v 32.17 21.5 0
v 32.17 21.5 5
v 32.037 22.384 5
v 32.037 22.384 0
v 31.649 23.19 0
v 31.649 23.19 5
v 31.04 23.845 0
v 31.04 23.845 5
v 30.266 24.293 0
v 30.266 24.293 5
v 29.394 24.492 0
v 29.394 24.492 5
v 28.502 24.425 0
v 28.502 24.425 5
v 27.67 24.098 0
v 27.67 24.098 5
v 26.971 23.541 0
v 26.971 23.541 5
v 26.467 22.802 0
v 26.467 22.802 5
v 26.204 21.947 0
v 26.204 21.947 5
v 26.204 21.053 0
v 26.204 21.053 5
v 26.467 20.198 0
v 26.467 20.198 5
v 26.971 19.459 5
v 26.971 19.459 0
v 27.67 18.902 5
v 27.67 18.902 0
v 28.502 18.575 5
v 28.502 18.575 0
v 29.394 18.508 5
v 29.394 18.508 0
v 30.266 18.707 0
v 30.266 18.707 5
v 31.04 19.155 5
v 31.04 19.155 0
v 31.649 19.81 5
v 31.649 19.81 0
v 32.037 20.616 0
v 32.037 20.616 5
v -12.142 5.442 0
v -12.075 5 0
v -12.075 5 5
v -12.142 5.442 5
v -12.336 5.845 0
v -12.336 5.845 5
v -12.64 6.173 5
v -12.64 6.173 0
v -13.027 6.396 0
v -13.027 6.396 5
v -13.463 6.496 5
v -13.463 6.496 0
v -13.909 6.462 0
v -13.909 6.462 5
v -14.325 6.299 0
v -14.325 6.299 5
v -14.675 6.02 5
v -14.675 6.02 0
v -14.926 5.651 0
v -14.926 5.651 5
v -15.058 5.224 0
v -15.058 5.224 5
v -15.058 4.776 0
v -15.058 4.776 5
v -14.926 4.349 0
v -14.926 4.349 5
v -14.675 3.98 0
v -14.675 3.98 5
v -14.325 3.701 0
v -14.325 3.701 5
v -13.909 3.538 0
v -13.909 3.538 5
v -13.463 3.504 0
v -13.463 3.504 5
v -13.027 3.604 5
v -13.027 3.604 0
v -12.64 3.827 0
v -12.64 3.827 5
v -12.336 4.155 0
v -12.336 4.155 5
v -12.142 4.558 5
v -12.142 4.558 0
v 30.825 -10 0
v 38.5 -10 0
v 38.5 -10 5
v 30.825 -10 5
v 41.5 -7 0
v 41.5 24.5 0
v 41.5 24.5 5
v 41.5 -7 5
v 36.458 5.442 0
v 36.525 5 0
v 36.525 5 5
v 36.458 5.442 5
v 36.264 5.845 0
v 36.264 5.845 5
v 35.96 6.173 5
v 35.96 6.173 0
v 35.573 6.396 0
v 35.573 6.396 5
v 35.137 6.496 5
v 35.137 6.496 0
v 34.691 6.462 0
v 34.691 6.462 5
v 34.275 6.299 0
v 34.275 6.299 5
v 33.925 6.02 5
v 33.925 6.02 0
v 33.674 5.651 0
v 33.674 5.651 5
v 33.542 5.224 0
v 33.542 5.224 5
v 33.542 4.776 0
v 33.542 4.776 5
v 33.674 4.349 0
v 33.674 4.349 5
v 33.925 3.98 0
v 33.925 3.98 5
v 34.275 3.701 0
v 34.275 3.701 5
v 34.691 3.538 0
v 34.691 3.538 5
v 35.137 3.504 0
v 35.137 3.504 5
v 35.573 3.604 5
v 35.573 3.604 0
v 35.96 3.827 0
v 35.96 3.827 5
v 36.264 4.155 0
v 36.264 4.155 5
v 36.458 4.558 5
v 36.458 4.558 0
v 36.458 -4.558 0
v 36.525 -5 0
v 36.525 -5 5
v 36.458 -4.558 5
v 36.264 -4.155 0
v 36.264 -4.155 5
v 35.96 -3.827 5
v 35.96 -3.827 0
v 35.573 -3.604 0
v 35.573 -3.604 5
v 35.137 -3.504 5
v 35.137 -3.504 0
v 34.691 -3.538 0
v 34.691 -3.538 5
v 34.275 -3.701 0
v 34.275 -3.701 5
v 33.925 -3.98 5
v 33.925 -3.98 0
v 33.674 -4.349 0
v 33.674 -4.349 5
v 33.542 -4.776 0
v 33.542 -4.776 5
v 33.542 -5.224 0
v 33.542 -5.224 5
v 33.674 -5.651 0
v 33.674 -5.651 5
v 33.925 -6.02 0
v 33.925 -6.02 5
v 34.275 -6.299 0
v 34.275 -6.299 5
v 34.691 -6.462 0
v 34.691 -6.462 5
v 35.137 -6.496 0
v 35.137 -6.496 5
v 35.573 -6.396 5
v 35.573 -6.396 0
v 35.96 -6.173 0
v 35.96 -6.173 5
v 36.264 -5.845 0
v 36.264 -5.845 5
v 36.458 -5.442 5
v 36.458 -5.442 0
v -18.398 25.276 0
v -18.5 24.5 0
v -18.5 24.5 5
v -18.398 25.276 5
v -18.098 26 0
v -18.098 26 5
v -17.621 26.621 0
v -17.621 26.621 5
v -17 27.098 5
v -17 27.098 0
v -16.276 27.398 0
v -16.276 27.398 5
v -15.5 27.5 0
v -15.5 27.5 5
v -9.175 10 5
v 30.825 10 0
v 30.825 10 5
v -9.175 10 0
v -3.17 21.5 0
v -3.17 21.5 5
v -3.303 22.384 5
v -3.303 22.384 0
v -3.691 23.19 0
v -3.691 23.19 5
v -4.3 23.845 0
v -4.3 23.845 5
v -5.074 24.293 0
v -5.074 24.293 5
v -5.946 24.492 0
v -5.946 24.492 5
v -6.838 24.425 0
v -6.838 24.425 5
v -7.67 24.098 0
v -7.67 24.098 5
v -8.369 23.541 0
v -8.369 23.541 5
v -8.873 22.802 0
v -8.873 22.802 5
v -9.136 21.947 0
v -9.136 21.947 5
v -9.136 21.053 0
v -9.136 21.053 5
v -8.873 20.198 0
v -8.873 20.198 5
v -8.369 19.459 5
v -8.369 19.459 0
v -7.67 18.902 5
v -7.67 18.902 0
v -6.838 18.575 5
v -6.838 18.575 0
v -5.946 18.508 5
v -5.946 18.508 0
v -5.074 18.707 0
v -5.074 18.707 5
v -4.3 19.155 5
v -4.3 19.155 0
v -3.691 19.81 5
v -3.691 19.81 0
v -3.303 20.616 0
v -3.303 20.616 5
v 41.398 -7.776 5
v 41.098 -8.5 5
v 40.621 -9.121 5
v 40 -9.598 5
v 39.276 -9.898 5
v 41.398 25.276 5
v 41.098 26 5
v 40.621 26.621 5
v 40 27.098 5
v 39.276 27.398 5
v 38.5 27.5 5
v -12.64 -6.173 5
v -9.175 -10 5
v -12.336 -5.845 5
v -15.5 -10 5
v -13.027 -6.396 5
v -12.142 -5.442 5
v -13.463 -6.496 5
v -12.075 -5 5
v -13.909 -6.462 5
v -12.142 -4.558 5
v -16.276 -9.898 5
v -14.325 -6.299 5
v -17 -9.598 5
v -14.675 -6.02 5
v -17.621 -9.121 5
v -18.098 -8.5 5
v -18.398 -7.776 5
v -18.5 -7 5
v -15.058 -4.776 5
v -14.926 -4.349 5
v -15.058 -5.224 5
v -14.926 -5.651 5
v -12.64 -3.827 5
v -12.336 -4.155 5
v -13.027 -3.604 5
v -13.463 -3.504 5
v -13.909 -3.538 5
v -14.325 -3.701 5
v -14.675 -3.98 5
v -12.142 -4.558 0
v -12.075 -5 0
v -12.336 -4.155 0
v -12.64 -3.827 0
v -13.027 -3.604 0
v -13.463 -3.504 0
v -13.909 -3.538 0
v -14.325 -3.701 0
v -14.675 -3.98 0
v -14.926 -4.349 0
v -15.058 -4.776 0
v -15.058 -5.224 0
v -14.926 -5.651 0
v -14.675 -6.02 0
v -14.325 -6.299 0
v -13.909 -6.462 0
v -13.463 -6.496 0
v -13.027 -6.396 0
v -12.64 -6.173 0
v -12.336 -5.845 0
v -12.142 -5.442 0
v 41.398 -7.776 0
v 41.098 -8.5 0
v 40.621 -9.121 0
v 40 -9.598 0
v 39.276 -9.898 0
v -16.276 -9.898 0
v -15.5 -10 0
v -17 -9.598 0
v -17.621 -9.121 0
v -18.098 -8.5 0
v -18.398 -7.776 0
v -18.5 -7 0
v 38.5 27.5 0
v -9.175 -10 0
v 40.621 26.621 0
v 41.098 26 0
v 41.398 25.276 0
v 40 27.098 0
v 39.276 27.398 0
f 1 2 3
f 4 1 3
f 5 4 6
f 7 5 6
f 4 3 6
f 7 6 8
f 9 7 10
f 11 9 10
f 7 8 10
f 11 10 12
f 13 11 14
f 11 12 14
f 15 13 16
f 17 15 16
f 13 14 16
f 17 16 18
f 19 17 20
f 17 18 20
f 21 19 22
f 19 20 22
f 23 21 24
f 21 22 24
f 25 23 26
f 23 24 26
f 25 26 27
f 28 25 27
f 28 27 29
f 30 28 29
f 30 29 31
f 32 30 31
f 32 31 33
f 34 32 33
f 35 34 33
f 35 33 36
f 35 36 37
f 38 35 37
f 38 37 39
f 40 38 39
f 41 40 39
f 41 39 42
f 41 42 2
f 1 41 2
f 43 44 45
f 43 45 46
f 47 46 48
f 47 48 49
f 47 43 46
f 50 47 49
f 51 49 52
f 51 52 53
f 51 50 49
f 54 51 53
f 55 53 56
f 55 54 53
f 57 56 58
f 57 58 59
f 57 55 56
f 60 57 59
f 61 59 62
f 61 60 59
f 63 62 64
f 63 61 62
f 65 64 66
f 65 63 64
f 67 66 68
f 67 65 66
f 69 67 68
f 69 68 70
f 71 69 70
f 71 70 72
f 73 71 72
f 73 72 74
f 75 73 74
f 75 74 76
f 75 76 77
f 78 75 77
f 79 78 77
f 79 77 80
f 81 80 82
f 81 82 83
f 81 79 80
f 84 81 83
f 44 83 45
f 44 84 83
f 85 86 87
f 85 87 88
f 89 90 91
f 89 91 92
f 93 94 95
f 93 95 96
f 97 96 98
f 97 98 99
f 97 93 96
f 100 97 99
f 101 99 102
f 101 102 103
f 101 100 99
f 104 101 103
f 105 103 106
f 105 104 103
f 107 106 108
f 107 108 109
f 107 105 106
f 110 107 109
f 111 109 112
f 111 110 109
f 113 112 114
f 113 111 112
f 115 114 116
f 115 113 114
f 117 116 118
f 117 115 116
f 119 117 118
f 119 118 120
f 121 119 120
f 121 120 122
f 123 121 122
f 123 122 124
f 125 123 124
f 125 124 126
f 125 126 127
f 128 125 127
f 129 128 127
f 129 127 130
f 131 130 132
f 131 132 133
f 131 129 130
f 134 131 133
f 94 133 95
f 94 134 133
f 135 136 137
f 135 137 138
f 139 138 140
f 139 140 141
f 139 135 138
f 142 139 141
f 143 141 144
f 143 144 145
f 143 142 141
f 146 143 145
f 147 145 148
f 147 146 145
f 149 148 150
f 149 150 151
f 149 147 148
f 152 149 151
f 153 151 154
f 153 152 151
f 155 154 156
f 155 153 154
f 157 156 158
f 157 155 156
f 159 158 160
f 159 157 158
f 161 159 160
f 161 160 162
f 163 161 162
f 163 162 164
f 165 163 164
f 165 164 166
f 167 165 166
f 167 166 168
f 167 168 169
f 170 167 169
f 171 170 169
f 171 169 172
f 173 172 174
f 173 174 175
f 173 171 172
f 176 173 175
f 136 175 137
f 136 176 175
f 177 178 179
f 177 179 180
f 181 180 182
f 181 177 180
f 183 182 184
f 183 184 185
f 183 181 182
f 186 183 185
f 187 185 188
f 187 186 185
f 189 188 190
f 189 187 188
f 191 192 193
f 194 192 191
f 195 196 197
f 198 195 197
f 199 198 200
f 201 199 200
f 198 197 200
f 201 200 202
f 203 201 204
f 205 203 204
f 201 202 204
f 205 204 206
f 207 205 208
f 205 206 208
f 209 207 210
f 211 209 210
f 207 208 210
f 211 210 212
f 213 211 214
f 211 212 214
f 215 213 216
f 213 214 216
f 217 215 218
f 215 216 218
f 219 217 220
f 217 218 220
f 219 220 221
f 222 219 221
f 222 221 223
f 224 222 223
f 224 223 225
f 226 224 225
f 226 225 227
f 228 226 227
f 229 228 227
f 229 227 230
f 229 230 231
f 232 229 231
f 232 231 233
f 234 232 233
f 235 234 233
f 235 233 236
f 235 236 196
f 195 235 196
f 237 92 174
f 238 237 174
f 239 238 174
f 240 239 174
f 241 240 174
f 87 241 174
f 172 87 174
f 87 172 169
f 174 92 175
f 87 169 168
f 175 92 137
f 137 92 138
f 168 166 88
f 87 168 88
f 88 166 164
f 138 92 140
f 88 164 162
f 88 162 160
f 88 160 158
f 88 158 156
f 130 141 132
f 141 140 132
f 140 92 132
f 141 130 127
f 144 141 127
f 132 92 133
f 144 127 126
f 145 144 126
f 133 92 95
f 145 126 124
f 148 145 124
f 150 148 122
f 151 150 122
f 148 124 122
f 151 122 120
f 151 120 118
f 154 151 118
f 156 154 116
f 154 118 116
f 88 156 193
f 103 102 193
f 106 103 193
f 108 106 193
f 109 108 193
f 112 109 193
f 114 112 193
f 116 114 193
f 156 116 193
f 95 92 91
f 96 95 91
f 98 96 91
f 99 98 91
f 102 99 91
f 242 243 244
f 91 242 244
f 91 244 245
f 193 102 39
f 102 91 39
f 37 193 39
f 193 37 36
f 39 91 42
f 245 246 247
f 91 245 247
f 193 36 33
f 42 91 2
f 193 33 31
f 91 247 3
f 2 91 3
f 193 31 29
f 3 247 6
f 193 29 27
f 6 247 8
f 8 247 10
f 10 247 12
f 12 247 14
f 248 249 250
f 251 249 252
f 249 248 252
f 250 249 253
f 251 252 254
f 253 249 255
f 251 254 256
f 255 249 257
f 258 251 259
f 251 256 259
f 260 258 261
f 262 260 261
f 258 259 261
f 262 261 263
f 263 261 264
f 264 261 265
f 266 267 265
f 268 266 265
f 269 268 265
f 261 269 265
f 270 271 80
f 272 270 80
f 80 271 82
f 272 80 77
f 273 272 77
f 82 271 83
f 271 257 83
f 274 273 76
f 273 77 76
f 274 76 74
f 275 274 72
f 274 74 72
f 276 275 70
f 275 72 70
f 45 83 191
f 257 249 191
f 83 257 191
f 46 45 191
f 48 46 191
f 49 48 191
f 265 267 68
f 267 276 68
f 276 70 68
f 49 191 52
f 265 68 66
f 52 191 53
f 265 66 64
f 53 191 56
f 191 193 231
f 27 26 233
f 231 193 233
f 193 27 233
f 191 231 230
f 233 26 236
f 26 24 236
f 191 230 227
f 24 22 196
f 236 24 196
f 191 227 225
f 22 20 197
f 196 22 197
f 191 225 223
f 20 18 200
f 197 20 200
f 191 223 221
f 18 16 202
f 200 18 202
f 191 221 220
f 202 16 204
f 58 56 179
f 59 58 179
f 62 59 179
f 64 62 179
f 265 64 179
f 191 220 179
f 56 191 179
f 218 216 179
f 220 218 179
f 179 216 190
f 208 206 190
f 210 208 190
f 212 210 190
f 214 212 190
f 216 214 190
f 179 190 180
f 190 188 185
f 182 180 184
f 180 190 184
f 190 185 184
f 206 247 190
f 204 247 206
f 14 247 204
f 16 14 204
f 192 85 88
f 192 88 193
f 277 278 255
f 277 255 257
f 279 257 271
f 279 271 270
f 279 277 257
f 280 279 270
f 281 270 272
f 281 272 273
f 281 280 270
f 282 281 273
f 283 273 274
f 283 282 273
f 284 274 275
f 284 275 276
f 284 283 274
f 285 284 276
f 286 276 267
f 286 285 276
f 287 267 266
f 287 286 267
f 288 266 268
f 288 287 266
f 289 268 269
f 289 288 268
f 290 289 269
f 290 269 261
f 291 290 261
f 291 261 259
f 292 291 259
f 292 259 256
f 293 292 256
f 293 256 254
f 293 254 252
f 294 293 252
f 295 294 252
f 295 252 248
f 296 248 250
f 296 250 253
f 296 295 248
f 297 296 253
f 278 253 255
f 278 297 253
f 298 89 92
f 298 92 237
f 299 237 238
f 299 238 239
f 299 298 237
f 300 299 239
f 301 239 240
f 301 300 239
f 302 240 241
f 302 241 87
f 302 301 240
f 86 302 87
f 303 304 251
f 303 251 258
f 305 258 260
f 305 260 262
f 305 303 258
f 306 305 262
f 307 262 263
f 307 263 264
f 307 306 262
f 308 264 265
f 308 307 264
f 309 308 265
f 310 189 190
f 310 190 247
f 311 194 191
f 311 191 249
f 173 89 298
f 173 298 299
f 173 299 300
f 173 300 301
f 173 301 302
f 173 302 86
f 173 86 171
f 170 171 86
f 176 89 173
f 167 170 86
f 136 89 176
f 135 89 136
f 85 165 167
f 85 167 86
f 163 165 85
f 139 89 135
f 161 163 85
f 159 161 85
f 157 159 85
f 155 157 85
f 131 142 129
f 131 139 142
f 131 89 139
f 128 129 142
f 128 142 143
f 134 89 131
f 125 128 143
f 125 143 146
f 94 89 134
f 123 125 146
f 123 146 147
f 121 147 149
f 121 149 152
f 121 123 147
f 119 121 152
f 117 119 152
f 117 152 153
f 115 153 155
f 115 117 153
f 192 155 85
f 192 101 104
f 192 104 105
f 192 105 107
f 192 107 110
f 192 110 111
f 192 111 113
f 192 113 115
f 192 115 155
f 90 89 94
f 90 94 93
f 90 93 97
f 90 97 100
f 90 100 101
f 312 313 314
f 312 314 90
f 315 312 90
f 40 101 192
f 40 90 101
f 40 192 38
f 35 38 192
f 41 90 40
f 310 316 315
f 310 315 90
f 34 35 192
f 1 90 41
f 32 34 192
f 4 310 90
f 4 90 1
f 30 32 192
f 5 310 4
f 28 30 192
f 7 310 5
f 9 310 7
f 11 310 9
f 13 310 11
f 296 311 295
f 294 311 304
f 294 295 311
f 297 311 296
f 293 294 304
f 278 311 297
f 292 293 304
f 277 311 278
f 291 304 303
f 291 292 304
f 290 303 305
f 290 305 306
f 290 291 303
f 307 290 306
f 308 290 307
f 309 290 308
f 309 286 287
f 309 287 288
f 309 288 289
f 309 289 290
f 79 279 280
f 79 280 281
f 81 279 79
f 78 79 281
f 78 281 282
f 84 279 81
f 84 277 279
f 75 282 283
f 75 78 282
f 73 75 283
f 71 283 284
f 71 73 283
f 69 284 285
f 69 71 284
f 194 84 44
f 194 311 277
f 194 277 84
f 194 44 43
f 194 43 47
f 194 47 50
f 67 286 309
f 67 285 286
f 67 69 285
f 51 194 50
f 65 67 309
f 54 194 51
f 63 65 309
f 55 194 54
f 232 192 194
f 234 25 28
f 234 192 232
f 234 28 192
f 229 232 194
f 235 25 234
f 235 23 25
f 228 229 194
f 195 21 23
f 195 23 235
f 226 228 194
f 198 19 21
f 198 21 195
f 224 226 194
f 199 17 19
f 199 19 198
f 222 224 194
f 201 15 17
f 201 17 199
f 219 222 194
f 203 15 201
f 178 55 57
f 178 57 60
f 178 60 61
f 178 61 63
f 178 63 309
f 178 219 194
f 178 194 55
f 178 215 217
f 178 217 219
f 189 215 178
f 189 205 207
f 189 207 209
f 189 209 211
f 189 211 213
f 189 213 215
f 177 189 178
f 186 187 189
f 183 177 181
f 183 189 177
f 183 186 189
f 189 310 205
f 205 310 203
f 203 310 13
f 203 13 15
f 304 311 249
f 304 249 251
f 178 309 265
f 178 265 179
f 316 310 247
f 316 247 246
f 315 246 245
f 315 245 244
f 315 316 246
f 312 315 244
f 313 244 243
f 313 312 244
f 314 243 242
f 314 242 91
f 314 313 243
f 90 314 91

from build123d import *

# Parameters (mm, degrees)
SKETCH_1_R          = 1.5
EXTRUDE_1_DEPTH     = 5
SKETCH_2_R          = 3
CUT_EXTRUDE_1_DEPTH = 10


with BuildPart() as part:
    # 草图1 → 凸台-拉伸1 (new body)
    with BuildSketch(Plane.XY):
        with BuildLine():
            Line((-15.5, 27.5), (38.5, 27.5))
            ThreePointArc((38.5, 27.5), (40.621320344, 26.621320344), (41.5, 24.5))
            Line((41.5, 24.5), (41.5, -7))
            ThreePointArc((41.5, -7), (40.621320344, -9.121320344), (38.5, -10))
            Line((38.5, -10), (33.3, -10))
            Line((33.3, -10), (30.825, -10))
            Line((30.825, -10), (30.825, 10))
            Line((30.825, 10), (-9.175, 10))
            Line((-9.175, 10), (-9.175, -10))
            Line((-9.175, -10), (-15.5, -10))
            ThreePointArc((-15.5, -10), (-17.621320344, -9.121320344), (-18.5, -7))
            Line((-18.5, -7), (-18.5, 24.5))
            ThreePointArc((-18.5, 24.5), (-17.621320344, 26.621320344), (-15.5, 27.5))
        make_face()
        with Locations((-13.575, 5)):
            Circle(SKETCH_1_R, mode=Mode.SUBTRACT)
        with Locations((-13.575, -5)):
            Circle(SKETCH_1_R, mode=Mode.SUBTRACT)
        with Locations((35.025, 5)):
            Circle(SKETCH_1_R, mode=Mode.SUBTRACT)
        with Locations((35.025, -5)):
            Circle(SKETCH_1_R, mode=Mode.SUBTRACT)
    extrude(amount=EXTRUDE_1_DEPTH)

    # 草图2 → 切除-拉伸1 (cut)
    with BuildSketch(Plane.XY.offset(5)):
        with Locations((-6.17, 21.5)):
            Circle(SKETCH_2_R)
        with Locations((29.17, 21.5)):
            Circle(SKETCH_2_R)
    extrude(amount=-CUT_EXTRUDE_1_DEPTH, mode=Mode.SUBTRACT)


solid = part.part
